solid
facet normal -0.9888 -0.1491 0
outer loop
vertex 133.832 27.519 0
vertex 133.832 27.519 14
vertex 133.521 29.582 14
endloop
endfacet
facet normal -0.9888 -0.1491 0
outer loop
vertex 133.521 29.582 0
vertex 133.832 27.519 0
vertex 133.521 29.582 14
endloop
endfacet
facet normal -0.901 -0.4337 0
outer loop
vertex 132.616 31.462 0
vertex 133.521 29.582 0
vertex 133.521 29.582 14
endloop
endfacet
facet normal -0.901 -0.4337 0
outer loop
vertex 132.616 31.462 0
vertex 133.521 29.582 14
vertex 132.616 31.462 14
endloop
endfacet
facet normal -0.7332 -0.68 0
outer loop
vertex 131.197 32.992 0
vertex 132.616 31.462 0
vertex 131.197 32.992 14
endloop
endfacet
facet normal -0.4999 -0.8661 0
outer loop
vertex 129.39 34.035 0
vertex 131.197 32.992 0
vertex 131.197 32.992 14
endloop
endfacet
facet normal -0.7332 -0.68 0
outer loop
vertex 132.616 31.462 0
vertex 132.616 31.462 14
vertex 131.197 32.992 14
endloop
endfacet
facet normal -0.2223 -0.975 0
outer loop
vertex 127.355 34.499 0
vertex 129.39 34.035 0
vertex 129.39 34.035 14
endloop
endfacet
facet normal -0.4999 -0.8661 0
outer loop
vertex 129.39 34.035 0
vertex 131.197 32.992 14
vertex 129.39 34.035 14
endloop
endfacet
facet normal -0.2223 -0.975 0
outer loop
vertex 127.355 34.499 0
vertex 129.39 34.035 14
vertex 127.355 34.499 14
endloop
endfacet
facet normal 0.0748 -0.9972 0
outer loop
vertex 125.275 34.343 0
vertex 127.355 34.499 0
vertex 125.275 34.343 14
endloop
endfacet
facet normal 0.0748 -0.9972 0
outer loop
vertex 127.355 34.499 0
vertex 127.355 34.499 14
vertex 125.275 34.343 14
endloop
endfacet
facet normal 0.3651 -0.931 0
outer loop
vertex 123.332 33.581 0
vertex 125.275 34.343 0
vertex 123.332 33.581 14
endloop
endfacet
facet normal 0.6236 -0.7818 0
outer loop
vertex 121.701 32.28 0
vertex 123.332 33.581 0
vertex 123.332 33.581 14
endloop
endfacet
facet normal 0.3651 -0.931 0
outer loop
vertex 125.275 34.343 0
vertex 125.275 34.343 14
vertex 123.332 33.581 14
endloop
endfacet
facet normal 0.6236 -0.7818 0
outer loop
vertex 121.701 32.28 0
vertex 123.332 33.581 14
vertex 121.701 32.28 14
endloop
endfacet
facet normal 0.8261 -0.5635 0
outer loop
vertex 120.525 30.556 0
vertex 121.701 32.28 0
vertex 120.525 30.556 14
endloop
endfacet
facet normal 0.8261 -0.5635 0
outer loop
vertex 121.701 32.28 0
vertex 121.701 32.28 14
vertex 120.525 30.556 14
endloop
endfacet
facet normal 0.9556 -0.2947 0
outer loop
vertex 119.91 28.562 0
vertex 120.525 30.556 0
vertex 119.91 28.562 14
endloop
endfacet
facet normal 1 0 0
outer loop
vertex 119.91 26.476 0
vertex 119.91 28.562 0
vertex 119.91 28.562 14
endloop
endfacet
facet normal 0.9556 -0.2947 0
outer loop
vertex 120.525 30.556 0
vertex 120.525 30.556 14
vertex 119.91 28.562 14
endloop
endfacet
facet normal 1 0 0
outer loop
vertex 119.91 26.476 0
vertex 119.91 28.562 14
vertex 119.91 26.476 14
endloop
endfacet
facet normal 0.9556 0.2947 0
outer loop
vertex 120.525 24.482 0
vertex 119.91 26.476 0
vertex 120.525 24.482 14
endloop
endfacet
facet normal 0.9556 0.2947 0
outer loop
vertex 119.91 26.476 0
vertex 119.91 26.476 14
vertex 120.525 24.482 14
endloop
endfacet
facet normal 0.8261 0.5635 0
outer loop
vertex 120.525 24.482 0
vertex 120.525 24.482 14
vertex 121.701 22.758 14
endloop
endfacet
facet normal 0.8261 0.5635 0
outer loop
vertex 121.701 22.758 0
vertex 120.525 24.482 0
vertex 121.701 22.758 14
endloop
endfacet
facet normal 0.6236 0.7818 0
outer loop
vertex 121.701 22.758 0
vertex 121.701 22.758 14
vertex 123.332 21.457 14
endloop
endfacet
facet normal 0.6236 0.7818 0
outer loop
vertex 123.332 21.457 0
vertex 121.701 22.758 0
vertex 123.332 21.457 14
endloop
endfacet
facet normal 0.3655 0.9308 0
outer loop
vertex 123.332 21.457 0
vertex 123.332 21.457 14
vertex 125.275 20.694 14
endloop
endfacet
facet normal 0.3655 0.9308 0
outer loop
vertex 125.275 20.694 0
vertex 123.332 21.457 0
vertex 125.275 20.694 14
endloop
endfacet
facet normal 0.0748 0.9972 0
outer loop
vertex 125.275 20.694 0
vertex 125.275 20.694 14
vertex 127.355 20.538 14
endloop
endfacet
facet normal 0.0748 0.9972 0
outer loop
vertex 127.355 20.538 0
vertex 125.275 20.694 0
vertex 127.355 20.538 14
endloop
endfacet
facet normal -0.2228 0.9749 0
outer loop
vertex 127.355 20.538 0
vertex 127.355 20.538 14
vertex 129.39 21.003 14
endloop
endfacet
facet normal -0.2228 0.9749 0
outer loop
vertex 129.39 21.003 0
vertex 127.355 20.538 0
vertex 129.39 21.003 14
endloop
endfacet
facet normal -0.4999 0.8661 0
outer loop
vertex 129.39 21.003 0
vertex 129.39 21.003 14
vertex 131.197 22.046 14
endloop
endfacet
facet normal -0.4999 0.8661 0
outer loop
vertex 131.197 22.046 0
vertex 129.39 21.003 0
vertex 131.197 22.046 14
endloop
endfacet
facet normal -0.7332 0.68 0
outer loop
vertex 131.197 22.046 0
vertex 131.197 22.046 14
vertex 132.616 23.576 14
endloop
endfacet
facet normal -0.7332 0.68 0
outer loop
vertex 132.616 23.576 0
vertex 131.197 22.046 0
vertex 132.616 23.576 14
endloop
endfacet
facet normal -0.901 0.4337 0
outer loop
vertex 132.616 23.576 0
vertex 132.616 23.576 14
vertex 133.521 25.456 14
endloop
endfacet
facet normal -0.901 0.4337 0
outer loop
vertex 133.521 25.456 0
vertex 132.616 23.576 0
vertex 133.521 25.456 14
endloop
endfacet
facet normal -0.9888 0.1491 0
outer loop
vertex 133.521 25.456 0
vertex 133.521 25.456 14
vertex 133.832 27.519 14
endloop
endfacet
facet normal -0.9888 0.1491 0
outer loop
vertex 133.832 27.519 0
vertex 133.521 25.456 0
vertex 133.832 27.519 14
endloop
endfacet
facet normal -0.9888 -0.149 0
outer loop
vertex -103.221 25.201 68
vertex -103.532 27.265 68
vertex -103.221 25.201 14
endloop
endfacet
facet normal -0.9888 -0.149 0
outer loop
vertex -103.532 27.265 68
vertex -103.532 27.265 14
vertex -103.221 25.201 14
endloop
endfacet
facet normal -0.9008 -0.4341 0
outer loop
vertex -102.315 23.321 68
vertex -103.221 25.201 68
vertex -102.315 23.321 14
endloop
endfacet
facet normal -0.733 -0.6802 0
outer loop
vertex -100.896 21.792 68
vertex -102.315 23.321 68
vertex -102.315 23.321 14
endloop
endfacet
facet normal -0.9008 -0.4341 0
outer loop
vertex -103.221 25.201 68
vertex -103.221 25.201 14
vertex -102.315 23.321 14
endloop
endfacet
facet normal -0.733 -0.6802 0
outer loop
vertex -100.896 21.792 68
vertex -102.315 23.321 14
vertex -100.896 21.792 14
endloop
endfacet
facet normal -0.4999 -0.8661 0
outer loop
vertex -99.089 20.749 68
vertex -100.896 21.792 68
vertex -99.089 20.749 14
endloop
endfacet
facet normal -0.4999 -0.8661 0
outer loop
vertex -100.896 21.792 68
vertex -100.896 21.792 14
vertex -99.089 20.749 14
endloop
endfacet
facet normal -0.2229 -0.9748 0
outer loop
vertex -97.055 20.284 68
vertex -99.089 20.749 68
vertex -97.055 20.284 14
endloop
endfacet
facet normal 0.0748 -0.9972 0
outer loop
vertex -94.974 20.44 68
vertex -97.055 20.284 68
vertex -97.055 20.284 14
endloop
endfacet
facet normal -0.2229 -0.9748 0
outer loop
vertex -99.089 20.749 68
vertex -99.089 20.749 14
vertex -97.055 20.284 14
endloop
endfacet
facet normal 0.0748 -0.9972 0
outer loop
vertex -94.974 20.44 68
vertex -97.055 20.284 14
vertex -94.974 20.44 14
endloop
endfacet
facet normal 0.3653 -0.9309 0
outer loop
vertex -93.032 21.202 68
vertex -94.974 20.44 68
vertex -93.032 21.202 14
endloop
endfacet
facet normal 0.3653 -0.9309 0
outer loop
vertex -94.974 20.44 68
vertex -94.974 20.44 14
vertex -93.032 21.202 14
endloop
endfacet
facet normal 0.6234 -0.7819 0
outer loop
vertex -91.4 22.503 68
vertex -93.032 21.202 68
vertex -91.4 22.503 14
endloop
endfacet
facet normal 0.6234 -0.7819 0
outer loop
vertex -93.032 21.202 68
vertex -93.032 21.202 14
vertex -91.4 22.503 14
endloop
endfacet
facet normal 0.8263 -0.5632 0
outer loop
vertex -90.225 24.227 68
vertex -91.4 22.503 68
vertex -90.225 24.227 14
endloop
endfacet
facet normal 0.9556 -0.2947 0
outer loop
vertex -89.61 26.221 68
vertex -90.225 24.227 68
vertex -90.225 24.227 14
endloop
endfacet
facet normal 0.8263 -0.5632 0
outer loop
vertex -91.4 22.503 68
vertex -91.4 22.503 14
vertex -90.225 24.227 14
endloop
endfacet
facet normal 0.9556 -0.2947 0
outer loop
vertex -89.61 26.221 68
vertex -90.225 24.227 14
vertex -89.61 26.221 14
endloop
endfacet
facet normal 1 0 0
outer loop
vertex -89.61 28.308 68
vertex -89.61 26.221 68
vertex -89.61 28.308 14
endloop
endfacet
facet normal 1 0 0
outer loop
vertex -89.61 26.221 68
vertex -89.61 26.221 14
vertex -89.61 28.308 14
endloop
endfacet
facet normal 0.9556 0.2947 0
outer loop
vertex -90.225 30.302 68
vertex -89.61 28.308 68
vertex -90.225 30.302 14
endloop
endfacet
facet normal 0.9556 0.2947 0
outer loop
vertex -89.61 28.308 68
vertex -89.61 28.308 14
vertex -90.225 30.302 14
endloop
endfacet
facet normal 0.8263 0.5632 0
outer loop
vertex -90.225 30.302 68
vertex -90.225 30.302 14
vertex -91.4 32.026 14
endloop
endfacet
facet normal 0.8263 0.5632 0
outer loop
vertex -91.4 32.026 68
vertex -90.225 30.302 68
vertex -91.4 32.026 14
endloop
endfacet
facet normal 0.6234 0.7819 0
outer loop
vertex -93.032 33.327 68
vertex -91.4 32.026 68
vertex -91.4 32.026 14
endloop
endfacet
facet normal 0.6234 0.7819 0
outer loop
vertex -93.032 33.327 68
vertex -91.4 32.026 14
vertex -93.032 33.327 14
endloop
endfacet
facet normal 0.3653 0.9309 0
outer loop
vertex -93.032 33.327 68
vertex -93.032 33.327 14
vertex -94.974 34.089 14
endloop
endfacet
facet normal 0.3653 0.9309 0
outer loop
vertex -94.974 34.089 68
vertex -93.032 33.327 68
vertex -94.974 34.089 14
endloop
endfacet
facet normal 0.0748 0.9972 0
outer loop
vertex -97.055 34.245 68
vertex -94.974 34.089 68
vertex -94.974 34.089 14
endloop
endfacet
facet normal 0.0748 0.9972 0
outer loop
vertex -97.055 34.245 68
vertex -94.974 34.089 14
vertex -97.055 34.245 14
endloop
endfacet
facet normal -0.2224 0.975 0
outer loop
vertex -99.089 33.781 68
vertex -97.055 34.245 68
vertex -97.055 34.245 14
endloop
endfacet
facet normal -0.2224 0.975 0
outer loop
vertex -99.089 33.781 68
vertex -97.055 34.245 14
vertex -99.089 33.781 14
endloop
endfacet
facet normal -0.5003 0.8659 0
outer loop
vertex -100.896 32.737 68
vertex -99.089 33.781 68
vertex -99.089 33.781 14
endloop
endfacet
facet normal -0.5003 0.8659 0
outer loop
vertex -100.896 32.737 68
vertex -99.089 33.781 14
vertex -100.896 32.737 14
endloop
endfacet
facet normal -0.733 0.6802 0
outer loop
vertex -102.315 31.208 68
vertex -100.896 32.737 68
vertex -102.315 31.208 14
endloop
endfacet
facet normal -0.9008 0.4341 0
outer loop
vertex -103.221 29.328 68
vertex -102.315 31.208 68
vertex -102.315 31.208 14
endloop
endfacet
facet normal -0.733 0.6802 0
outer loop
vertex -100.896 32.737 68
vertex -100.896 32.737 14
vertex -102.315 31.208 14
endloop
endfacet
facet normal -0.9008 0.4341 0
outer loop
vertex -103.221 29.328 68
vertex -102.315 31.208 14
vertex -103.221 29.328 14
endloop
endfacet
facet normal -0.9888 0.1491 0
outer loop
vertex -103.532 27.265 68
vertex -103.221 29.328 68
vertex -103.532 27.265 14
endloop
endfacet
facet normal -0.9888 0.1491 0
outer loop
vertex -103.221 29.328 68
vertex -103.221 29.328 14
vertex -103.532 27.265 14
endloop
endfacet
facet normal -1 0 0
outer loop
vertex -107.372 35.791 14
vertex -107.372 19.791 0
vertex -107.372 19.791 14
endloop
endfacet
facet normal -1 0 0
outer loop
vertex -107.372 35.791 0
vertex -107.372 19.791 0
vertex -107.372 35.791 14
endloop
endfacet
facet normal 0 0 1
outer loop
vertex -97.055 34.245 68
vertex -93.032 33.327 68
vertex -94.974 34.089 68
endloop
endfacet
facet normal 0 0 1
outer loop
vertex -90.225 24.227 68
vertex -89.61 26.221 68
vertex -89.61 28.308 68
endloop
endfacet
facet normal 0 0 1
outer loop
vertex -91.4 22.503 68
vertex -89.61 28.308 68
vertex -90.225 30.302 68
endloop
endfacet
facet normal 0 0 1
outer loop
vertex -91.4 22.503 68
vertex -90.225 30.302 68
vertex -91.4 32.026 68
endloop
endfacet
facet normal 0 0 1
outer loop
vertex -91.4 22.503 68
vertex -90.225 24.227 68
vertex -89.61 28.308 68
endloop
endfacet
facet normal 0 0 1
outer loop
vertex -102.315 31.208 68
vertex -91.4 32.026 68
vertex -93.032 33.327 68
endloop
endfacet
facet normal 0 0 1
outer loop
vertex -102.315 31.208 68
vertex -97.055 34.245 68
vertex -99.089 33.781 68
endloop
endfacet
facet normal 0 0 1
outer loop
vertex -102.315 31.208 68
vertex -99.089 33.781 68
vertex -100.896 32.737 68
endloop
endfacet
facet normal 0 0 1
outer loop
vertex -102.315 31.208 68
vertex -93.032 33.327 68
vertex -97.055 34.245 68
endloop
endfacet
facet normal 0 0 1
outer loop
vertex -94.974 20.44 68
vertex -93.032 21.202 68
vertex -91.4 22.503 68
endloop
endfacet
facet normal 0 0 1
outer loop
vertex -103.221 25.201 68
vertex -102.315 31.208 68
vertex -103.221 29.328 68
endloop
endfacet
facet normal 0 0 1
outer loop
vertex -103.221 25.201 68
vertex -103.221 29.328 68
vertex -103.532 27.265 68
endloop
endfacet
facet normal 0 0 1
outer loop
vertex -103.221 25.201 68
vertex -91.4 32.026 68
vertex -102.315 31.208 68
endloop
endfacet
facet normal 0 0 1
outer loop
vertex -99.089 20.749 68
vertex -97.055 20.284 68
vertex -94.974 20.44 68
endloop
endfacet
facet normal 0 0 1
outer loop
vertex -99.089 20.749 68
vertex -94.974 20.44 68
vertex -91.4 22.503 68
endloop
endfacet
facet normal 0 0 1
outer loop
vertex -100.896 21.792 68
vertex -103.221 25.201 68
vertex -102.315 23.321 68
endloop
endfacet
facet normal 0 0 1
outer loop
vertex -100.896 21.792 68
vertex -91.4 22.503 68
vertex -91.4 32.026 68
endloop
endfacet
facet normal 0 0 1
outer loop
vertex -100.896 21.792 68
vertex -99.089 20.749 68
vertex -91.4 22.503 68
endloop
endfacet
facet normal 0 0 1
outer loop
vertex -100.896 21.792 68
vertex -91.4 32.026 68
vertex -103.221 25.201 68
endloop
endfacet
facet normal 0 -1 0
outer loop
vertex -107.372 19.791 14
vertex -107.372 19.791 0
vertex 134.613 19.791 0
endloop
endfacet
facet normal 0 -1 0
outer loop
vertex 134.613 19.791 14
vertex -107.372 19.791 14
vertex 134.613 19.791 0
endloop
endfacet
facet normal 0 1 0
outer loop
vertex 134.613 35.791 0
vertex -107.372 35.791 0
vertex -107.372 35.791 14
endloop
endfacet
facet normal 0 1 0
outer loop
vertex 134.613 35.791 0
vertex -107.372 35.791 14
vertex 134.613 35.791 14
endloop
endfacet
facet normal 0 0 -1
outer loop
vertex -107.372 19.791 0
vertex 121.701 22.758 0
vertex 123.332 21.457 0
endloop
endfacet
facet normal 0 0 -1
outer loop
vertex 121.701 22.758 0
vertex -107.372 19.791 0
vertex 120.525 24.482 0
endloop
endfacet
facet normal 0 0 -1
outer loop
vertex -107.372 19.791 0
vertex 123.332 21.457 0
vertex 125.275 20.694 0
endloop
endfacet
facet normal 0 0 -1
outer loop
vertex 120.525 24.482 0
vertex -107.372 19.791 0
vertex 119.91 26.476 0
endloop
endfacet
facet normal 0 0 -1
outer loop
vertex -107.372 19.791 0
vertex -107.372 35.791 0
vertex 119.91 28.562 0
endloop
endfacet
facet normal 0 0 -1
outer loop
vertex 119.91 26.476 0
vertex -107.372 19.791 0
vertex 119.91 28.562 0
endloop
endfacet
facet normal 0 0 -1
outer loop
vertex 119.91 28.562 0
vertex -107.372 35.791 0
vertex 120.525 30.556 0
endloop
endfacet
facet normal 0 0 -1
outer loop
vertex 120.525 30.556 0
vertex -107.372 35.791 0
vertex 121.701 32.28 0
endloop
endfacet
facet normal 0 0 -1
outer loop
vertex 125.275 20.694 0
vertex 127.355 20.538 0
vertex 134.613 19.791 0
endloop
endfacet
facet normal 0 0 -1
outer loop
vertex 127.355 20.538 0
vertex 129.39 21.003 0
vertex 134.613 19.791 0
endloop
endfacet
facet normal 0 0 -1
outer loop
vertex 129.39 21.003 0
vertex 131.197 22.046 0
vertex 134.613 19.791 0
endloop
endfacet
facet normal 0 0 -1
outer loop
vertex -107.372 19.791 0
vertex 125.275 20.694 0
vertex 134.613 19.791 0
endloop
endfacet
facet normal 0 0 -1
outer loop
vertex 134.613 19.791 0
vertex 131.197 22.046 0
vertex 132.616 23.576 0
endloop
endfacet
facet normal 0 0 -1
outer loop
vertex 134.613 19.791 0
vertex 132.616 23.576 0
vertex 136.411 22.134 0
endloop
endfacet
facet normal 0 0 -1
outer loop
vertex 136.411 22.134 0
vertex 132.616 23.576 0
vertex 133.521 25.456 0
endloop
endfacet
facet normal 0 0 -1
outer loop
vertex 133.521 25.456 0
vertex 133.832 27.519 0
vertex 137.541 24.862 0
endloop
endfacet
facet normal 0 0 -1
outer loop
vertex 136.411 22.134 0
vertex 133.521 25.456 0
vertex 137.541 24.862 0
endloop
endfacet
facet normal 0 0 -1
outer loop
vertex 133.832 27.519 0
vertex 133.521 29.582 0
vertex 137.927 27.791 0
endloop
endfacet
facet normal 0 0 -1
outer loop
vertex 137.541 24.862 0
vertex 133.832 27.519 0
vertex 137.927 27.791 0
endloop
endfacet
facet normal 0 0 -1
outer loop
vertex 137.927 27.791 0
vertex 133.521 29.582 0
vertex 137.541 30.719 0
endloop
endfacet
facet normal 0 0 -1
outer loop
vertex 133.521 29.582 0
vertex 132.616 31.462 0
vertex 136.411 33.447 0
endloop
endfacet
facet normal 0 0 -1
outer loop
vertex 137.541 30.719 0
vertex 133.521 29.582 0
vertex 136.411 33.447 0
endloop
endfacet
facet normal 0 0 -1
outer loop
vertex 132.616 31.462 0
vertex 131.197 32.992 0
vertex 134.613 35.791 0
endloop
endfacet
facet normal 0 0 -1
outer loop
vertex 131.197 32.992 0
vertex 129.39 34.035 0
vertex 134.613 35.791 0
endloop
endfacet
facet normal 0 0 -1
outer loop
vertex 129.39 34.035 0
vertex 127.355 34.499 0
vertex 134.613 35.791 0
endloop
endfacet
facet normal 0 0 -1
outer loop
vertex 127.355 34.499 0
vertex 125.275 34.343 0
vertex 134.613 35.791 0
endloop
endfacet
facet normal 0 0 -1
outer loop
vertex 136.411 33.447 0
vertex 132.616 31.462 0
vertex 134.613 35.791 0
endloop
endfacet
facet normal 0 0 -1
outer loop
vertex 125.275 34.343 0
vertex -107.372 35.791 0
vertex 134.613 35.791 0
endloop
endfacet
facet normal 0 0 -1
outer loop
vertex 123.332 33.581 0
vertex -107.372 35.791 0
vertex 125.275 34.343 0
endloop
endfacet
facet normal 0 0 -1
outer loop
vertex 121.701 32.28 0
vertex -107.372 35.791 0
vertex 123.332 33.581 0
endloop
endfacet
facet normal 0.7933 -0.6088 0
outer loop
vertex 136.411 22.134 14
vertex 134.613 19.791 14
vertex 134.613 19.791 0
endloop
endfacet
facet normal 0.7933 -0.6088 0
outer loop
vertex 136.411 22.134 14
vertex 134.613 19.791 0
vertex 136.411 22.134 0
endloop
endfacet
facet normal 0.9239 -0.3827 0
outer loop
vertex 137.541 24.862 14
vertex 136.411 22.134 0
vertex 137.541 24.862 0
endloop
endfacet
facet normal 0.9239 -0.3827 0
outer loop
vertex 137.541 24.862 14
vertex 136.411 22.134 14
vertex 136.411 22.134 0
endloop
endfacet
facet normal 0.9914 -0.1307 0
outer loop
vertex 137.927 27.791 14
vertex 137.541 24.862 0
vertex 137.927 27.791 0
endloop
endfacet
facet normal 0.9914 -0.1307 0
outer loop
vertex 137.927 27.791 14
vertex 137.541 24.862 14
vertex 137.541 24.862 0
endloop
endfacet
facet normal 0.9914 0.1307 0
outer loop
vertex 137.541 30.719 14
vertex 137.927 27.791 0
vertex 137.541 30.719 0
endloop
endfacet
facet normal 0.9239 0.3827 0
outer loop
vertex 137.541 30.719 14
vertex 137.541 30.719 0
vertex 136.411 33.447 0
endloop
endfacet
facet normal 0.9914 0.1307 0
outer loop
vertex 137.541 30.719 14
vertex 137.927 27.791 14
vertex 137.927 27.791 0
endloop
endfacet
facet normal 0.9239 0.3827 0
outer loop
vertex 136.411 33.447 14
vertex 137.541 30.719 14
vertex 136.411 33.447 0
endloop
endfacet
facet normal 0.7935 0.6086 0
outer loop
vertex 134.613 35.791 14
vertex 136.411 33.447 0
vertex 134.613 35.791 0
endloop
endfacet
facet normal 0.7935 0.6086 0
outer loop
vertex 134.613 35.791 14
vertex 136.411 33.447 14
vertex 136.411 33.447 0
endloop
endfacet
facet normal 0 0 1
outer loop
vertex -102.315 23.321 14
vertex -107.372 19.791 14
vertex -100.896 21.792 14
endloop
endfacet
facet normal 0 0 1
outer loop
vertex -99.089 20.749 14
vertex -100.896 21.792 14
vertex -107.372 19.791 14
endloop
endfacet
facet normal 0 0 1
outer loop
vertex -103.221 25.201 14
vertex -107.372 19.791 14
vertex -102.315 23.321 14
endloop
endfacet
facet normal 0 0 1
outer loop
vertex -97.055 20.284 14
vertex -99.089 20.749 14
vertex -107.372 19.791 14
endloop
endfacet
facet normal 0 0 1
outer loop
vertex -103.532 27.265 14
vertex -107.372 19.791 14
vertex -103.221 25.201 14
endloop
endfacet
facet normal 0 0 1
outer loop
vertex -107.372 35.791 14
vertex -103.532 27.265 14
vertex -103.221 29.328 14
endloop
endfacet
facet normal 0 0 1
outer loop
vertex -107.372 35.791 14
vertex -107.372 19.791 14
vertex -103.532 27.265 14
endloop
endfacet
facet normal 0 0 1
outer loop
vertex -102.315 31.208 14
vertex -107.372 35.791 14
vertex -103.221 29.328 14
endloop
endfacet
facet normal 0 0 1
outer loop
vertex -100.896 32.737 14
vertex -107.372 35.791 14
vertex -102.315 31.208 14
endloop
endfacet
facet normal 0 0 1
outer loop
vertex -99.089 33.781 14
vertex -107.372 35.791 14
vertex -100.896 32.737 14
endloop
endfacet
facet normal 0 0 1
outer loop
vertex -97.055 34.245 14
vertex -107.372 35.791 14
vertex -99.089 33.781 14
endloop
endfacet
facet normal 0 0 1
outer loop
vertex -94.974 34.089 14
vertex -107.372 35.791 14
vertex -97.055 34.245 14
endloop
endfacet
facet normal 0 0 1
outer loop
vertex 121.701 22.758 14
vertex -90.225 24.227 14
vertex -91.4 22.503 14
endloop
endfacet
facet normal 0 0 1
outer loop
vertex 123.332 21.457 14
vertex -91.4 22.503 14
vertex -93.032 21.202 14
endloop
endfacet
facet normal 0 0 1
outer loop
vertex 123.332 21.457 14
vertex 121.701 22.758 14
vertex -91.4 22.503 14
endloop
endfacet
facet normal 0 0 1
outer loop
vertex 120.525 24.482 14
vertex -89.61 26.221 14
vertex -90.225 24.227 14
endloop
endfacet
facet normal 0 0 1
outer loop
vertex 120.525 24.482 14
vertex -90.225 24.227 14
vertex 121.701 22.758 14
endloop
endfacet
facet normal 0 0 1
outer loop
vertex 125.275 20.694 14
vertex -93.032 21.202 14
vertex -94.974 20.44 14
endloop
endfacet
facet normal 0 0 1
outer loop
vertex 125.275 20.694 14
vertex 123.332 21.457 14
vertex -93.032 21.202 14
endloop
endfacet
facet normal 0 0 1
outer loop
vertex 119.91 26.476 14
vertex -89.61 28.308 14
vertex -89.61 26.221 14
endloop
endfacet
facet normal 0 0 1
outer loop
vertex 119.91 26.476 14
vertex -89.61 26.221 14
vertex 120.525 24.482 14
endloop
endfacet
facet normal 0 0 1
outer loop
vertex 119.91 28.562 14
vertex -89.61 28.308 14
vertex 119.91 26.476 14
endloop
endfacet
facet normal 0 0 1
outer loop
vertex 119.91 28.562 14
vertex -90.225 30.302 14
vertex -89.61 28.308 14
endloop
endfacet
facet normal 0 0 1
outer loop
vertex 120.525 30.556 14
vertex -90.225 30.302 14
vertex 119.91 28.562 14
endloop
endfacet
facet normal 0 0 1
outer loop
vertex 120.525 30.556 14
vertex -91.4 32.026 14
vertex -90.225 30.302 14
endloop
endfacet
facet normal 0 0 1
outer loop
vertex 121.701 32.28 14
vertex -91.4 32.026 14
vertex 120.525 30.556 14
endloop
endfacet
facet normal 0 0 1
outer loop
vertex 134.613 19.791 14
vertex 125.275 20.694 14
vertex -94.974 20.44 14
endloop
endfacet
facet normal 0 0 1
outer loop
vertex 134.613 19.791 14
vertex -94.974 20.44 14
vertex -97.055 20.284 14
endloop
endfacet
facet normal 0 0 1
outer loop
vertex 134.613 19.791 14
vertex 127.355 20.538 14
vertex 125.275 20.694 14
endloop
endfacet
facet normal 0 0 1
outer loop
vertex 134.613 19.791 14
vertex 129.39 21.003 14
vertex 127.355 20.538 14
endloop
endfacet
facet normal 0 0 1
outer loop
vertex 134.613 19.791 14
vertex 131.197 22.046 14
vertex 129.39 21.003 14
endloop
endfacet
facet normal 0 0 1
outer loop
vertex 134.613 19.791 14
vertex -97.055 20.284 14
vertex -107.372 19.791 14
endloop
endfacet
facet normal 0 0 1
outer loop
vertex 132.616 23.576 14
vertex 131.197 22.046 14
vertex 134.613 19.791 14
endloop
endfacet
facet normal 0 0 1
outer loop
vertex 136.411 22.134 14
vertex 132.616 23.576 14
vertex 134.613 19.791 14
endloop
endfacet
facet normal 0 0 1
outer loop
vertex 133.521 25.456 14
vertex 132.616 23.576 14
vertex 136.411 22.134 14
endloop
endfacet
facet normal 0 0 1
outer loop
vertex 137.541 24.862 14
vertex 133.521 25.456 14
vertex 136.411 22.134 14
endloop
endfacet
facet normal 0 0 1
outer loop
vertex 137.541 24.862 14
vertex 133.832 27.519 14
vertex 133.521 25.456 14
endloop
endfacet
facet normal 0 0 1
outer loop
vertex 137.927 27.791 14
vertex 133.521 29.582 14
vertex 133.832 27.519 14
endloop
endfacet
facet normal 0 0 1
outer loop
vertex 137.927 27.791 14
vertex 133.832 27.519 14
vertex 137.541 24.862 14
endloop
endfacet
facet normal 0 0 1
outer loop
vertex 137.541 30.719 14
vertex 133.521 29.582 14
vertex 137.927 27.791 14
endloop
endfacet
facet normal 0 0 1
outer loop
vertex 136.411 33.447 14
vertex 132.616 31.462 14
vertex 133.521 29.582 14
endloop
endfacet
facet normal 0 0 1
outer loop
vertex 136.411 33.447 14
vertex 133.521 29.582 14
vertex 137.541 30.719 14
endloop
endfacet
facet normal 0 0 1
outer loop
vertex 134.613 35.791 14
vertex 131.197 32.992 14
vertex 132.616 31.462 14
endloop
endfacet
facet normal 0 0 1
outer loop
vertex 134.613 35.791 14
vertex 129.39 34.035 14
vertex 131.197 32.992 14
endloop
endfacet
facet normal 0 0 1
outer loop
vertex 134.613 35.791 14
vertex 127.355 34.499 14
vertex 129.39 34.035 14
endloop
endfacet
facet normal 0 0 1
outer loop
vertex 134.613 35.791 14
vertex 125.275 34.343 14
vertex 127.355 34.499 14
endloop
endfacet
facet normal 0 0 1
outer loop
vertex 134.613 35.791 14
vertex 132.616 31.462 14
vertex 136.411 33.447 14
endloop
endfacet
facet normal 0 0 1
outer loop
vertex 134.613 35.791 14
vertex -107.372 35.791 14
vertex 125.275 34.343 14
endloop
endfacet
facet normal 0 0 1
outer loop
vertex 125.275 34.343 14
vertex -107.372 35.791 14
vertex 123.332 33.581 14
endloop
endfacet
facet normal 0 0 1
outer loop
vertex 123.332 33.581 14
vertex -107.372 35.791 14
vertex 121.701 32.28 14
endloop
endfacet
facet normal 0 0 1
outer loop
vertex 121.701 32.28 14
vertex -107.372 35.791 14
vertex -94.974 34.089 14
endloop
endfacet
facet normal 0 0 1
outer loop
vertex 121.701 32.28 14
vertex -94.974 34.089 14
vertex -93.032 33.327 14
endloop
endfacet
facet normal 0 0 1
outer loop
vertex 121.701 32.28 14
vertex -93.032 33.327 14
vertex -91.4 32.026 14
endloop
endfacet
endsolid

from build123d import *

# Parameters (mm, degrees)
SKETCH1_W           = 250
SKETCH1_H           = 16
BOSS_EXTRUDE1_DEPTH = 14
SKETCH2_R           = 7
CUT_EXTRUDE1_DEPTH  = 148.715171273
CUT_EXTRUDE3_DEPTH  = 148.715171273
SKETCH4_R           = 7
BOSS_EXTRUDE2_DEPTH = 14
SKETCH5_R           = 7
BOSS_EXTRUDE3_DEPTH = 40


with BuildPart() as part:
    # Sketch1 → Boss-Extrude1 (new body)
    with BuildSketch(Plane.XY):
        with Locations((17.628205128, 27.790598291)):
            Rectangle(SKETCH1_W, SKETCH1_H)
    extrude(amount=BOSS_EXTRUDE1_DEPTH)

    # Sketch2 → Cut-Extrude1 (cut, through all)
    with BuildSketch(Plane.XY.offset(14)):
        with Locations((126.832264356, 27.518873536)):
            Circle(SKETCH2_R)
    extrude(amount=-CUT_EXTRUDE1_DEPTH, mode=Mode.SUBTRACT)

    # Sketch3 → Cut-Extrude3 (cut, through all)
    with BuildSketch(Plane.XY.offset(14)):
        with BuildLine():
            Line((142.628205128, 19.790598291), (134.612843431, 19.790598291))
            ThreePointArc((134.612843431, 19.790598291), (137.92655193, 27.790598291), (134.612843431, 35.790598291))
            Line((134.612843431, 35.790598291), (142.628205128, 35.790598291))
            Line((142.628205128, 35.790598291), (142.628205128, 19.790598291))
        make_face()
    extrude(amount=-CUT_EXTRUDE3_DEPTH, mode=Mode.SUBTRACT)

    # Sketch4 → Boss-Extrude2 (add)
    with BuildSketch(Plane.XY.offset(14)):
        with Locations(Location((-96.531660716, 27.264616337, 0), (0, 0, 180))):
            Circle(SKETCH4_R)
    extrude(amount=BOSS_EXTRUDE2_DEPTH)

    # Sketch5 → Boss-Extrude3 (add)
    with BuildSketch(Plane.XY.offset(28)):
        with Locations(Location((-96.531660716, 27.264616337, 0), (0, 0, 180))):
            Circle(SKETCH5_R)
    extrude(amount=BOSS_EXTRUDE3_DEPTH)


solid = part.part
